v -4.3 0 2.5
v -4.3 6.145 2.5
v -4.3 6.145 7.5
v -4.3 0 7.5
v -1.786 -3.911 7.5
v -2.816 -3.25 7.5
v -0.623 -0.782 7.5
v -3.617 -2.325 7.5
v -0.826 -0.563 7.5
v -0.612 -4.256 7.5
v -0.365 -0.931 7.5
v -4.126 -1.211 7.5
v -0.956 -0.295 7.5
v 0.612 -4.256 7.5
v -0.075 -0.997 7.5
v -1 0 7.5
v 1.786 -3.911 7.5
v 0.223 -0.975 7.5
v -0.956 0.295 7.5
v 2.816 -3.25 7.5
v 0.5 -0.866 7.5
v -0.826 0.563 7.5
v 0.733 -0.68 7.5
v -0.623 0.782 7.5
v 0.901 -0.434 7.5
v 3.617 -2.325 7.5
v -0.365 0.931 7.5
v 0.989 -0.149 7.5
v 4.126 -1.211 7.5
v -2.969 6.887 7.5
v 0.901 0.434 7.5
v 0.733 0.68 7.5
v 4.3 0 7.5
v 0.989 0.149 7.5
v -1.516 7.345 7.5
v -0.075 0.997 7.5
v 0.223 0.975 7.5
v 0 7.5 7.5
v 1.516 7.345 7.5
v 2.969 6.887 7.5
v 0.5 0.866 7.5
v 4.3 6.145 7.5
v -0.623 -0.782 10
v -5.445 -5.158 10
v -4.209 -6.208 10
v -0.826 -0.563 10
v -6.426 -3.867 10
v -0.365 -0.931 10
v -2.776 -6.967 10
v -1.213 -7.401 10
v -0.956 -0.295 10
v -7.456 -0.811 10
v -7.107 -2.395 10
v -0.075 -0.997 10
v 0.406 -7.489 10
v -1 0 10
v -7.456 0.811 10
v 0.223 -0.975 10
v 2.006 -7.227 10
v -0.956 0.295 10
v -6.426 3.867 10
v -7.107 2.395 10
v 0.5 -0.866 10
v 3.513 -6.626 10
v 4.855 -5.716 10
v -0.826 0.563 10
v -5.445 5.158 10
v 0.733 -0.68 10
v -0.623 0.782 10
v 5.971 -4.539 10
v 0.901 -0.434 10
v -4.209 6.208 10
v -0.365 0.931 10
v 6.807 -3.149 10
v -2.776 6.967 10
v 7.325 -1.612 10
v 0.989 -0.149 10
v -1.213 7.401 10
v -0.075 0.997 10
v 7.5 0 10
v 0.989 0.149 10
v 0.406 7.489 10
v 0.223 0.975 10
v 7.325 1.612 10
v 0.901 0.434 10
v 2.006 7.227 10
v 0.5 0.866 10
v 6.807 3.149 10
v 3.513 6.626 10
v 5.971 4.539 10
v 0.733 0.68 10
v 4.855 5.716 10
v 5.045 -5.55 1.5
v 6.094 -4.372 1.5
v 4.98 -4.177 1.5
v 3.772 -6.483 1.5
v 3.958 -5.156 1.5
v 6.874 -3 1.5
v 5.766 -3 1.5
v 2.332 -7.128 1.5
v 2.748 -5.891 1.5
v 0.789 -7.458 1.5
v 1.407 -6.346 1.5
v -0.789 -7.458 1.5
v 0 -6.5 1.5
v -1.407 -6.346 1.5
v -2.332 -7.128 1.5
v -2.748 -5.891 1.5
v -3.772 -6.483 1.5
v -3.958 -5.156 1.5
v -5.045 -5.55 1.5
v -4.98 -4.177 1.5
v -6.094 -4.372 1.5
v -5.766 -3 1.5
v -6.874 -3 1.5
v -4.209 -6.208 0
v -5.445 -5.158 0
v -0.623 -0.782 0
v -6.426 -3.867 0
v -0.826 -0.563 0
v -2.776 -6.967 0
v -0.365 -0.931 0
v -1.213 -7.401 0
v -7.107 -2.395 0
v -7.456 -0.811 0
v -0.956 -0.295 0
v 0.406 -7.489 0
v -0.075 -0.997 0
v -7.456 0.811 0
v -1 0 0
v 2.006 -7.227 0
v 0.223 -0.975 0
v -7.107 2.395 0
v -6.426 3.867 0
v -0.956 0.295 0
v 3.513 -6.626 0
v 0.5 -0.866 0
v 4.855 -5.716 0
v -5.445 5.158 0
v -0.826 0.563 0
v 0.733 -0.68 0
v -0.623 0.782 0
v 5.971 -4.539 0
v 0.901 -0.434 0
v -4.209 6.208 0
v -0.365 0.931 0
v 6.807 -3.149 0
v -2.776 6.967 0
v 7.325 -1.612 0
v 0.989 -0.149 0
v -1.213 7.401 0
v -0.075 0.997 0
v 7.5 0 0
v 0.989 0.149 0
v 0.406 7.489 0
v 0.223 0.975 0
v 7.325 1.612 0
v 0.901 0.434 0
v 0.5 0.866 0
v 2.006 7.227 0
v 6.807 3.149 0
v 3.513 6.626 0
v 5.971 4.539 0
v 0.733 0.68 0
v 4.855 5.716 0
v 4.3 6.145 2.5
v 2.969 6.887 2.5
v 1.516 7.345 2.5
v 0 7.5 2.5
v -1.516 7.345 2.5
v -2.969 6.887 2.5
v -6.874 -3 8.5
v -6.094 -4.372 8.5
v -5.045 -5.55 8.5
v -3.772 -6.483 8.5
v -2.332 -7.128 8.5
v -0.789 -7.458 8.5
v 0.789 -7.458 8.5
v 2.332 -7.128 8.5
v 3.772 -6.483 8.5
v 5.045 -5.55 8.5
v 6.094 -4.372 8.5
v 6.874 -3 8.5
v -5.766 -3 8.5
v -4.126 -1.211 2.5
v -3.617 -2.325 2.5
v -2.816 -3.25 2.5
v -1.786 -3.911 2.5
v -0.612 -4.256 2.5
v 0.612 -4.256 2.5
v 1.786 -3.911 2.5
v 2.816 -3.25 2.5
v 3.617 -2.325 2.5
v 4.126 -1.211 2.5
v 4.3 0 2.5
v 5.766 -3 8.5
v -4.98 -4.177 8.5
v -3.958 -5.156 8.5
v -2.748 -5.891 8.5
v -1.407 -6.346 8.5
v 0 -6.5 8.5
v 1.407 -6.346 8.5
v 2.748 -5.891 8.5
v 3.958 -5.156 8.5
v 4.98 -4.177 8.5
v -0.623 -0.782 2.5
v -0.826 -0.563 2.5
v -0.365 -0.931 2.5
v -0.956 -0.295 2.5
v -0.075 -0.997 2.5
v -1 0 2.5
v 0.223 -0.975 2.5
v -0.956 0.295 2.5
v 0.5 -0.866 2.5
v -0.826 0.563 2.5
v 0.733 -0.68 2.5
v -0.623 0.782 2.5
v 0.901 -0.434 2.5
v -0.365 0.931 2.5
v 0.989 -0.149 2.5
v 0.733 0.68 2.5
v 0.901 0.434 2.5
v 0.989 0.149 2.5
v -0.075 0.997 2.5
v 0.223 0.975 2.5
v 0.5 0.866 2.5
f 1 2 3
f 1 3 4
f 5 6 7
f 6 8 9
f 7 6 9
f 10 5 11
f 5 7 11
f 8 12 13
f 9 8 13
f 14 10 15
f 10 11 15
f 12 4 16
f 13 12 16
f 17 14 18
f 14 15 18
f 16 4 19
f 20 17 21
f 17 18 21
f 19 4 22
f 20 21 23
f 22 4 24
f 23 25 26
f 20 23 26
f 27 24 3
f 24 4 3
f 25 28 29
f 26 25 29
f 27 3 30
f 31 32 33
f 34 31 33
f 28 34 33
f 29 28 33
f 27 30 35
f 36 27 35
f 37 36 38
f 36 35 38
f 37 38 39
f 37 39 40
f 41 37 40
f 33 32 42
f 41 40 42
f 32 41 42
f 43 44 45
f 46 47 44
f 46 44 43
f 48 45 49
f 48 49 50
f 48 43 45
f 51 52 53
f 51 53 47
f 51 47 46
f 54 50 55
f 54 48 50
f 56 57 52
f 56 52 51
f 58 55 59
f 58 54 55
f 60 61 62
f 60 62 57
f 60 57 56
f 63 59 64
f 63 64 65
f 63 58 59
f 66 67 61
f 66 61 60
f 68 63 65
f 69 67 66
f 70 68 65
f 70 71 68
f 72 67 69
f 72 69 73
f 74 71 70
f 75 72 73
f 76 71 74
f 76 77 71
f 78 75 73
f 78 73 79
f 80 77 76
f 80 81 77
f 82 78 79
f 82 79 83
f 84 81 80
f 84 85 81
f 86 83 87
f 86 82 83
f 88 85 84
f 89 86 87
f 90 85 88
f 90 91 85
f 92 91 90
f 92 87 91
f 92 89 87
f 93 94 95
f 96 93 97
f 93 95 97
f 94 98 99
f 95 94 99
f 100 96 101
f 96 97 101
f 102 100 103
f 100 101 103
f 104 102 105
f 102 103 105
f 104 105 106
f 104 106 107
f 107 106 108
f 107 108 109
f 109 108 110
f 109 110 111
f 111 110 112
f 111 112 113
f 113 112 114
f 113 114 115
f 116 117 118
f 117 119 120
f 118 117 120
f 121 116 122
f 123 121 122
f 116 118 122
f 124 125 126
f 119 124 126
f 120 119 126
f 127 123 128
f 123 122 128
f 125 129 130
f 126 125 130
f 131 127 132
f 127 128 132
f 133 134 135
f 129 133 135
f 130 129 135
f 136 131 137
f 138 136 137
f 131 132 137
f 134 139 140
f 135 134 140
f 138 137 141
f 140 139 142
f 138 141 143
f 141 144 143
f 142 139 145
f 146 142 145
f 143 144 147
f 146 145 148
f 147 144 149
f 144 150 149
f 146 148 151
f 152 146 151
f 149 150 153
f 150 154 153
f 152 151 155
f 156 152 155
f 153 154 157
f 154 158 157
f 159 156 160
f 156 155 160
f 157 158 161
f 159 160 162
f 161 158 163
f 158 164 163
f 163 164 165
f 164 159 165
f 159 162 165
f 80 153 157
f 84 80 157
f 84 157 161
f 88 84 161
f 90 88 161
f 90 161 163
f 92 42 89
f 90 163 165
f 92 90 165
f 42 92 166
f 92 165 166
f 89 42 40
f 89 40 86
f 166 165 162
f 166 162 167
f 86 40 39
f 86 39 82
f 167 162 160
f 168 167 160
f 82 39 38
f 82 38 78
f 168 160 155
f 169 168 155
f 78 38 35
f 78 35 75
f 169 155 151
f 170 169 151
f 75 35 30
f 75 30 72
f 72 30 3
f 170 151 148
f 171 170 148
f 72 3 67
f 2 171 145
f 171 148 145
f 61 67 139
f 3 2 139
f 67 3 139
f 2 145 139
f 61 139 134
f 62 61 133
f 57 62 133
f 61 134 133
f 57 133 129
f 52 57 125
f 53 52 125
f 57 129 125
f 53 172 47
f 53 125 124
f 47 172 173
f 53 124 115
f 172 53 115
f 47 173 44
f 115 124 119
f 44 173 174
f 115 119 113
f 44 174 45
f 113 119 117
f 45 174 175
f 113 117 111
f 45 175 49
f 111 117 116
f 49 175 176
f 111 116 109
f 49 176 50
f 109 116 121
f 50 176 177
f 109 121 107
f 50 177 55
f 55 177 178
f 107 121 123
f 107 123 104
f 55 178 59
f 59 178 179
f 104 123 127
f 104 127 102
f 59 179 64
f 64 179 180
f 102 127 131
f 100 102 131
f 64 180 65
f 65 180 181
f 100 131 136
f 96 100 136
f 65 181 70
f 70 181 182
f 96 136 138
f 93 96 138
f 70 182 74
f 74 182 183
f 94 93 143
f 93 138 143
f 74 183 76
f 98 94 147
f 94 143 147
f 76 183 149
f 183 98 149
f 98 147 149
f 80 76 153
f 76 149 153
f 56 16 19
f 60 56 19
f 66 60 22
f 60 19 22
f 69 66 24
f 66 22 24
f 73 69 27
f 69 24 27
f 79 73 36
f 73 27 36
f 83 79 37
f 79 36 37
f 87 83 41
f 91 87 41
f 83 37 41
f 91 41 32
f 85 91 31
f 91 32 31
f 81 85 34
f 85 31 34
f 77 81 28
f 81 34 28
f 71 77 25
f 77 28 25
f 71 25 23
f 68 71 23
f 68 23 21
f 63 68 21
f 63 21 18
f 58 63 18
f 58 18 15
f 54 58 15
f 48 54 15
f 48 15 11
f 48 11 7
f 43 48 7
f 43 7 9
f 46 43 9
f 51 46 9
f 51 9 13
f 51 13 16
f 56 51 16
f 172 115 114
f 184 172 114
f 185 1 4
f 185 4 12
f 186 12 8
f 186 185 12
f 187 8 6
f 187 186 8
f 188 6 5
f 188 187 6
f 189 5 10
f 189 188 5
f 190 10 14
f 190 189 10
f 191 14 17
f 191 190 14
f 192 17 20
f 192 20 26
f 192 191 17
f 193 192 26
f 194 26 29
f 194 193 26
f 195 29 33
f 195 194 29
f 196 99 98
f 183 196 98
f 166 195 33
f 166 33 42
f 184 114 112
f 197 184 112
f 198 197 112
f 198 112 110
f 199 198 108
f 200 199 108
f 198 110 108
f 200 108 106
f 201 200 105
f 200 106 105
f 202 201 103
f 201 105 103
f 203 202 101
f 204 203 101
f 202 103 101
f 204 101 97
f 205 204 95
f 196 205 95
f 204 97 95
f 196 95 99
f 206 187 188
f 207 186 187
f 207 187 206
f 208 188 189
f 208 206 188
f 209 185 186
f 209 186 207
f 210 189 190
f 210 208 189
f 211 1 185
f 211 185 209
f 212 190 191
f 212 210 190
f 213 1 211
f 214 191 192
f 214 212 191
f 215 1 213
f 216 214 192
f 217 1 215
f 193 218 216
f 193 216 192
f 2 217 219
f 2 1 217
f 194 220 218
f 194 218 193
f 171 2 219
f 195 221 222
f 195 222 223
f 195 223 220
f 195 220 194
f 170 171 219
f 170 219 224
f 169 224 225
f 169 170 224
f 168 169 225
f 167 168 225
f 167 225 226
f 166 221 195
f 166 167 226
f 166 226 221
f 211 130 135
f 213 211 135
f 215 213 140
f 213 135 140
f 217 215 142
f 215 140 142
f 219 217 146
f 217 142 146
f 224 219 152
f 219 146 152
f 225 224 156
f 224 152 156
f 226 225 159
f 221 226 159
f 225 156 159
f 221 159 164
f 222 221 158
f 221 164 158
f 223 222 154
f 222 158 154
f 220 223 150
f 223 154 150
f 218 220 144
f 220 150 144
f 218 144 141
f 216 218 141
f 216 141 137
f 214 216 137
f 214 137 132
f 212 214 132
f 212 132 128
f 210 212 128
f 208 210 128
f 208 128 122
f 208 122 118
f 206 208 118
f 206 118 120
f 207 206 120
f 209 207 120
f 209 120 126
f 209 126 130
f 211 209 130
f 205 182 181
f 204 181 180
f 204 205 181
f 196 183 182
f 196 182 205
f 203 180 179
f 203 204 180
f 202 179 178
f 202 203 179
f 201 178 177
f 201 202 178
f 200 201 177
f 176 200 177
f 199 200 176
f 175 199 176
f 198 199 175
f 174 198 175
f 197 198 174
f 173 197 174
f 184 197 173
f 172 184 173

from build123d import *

# Parameters (mm, degrees)
SKETCH_1_R          = 7.5
EXTRUDE_1_DEPTH     = 10
CUT_EXTRUDE_1_DEPTH = 5
SKETCH_3_R          = 1
CUT_EXTRUDE_2_DEPTH = 15.577379737
CUT_EXTRUDE_3_DEPTH = 7


with BuildPart() as part:
    # 草图1 → 凸台-拉伸1 (new body)
    with BuildSketch(Plane.XY):
        Circle(SKETCH_1_R)
    extrude(amount=EXTRUDE_1_DEPTH)

    # 草图2 → 切除-拉伸1 (cut)
    with BuildSketch(Plane(origin=(0, 0, 2.5), x_dir=(-1, 0, 0), z_dir=(0, 0, -1))):
        with BuildLine():
            Line((-4.3, 0), (-4.3, 6.144916598))
            ThreePointArc((-4.3, 6.144916598), (0, 7.5), (4.3, 6.144916598))
            Line((4.3, 6.144916598), (4.3, 0))
            ThreePointArc((4.3, 0), (0, -4.3), (-4.3, 0))
        make_face()
    extrude(amount=-CUT_EXTRUDE_1_DEPTH, mode=Mode.SUBTRACT)

    # 草图3 → 切除-拉伸2 (cut, through all)
    with BuildSketch(Plane(origin=(0, 0, 0), x_dir=(-1, 0, 0), z_dir=(0, 0, -1))):
        Circle(SKETCH_3_R)
    extrude(amount=-CUT_EXTRUDE_2_DEPTH, mode=Mode.SUBTRACT)

    # 草图5 → 切除-拉伸3 (cut)
    with BuildSketch(Plane(origin=(0, 0, 1.5), x_dir=(-1, 0, 0), z_dir=(0, 0, -1))):
        with BuildLine():
            Line((-5.766281297, -3), (-6.873863542, -3))
            ThreePointArc((-6.873863542, -3), (0, -7.5), (6.873863542, -3))
            Line((6.873863542, -3), (5.766281297, -3))
            ThreePointArc((5.766281297, -3), (0, -6.5), (-5.766281297, -3))
        make_face()
    extrude(amount=-CUT_EXTRUDE_3_DEPTH, mode=Mode.SUBTRACT)


solid = part.part
